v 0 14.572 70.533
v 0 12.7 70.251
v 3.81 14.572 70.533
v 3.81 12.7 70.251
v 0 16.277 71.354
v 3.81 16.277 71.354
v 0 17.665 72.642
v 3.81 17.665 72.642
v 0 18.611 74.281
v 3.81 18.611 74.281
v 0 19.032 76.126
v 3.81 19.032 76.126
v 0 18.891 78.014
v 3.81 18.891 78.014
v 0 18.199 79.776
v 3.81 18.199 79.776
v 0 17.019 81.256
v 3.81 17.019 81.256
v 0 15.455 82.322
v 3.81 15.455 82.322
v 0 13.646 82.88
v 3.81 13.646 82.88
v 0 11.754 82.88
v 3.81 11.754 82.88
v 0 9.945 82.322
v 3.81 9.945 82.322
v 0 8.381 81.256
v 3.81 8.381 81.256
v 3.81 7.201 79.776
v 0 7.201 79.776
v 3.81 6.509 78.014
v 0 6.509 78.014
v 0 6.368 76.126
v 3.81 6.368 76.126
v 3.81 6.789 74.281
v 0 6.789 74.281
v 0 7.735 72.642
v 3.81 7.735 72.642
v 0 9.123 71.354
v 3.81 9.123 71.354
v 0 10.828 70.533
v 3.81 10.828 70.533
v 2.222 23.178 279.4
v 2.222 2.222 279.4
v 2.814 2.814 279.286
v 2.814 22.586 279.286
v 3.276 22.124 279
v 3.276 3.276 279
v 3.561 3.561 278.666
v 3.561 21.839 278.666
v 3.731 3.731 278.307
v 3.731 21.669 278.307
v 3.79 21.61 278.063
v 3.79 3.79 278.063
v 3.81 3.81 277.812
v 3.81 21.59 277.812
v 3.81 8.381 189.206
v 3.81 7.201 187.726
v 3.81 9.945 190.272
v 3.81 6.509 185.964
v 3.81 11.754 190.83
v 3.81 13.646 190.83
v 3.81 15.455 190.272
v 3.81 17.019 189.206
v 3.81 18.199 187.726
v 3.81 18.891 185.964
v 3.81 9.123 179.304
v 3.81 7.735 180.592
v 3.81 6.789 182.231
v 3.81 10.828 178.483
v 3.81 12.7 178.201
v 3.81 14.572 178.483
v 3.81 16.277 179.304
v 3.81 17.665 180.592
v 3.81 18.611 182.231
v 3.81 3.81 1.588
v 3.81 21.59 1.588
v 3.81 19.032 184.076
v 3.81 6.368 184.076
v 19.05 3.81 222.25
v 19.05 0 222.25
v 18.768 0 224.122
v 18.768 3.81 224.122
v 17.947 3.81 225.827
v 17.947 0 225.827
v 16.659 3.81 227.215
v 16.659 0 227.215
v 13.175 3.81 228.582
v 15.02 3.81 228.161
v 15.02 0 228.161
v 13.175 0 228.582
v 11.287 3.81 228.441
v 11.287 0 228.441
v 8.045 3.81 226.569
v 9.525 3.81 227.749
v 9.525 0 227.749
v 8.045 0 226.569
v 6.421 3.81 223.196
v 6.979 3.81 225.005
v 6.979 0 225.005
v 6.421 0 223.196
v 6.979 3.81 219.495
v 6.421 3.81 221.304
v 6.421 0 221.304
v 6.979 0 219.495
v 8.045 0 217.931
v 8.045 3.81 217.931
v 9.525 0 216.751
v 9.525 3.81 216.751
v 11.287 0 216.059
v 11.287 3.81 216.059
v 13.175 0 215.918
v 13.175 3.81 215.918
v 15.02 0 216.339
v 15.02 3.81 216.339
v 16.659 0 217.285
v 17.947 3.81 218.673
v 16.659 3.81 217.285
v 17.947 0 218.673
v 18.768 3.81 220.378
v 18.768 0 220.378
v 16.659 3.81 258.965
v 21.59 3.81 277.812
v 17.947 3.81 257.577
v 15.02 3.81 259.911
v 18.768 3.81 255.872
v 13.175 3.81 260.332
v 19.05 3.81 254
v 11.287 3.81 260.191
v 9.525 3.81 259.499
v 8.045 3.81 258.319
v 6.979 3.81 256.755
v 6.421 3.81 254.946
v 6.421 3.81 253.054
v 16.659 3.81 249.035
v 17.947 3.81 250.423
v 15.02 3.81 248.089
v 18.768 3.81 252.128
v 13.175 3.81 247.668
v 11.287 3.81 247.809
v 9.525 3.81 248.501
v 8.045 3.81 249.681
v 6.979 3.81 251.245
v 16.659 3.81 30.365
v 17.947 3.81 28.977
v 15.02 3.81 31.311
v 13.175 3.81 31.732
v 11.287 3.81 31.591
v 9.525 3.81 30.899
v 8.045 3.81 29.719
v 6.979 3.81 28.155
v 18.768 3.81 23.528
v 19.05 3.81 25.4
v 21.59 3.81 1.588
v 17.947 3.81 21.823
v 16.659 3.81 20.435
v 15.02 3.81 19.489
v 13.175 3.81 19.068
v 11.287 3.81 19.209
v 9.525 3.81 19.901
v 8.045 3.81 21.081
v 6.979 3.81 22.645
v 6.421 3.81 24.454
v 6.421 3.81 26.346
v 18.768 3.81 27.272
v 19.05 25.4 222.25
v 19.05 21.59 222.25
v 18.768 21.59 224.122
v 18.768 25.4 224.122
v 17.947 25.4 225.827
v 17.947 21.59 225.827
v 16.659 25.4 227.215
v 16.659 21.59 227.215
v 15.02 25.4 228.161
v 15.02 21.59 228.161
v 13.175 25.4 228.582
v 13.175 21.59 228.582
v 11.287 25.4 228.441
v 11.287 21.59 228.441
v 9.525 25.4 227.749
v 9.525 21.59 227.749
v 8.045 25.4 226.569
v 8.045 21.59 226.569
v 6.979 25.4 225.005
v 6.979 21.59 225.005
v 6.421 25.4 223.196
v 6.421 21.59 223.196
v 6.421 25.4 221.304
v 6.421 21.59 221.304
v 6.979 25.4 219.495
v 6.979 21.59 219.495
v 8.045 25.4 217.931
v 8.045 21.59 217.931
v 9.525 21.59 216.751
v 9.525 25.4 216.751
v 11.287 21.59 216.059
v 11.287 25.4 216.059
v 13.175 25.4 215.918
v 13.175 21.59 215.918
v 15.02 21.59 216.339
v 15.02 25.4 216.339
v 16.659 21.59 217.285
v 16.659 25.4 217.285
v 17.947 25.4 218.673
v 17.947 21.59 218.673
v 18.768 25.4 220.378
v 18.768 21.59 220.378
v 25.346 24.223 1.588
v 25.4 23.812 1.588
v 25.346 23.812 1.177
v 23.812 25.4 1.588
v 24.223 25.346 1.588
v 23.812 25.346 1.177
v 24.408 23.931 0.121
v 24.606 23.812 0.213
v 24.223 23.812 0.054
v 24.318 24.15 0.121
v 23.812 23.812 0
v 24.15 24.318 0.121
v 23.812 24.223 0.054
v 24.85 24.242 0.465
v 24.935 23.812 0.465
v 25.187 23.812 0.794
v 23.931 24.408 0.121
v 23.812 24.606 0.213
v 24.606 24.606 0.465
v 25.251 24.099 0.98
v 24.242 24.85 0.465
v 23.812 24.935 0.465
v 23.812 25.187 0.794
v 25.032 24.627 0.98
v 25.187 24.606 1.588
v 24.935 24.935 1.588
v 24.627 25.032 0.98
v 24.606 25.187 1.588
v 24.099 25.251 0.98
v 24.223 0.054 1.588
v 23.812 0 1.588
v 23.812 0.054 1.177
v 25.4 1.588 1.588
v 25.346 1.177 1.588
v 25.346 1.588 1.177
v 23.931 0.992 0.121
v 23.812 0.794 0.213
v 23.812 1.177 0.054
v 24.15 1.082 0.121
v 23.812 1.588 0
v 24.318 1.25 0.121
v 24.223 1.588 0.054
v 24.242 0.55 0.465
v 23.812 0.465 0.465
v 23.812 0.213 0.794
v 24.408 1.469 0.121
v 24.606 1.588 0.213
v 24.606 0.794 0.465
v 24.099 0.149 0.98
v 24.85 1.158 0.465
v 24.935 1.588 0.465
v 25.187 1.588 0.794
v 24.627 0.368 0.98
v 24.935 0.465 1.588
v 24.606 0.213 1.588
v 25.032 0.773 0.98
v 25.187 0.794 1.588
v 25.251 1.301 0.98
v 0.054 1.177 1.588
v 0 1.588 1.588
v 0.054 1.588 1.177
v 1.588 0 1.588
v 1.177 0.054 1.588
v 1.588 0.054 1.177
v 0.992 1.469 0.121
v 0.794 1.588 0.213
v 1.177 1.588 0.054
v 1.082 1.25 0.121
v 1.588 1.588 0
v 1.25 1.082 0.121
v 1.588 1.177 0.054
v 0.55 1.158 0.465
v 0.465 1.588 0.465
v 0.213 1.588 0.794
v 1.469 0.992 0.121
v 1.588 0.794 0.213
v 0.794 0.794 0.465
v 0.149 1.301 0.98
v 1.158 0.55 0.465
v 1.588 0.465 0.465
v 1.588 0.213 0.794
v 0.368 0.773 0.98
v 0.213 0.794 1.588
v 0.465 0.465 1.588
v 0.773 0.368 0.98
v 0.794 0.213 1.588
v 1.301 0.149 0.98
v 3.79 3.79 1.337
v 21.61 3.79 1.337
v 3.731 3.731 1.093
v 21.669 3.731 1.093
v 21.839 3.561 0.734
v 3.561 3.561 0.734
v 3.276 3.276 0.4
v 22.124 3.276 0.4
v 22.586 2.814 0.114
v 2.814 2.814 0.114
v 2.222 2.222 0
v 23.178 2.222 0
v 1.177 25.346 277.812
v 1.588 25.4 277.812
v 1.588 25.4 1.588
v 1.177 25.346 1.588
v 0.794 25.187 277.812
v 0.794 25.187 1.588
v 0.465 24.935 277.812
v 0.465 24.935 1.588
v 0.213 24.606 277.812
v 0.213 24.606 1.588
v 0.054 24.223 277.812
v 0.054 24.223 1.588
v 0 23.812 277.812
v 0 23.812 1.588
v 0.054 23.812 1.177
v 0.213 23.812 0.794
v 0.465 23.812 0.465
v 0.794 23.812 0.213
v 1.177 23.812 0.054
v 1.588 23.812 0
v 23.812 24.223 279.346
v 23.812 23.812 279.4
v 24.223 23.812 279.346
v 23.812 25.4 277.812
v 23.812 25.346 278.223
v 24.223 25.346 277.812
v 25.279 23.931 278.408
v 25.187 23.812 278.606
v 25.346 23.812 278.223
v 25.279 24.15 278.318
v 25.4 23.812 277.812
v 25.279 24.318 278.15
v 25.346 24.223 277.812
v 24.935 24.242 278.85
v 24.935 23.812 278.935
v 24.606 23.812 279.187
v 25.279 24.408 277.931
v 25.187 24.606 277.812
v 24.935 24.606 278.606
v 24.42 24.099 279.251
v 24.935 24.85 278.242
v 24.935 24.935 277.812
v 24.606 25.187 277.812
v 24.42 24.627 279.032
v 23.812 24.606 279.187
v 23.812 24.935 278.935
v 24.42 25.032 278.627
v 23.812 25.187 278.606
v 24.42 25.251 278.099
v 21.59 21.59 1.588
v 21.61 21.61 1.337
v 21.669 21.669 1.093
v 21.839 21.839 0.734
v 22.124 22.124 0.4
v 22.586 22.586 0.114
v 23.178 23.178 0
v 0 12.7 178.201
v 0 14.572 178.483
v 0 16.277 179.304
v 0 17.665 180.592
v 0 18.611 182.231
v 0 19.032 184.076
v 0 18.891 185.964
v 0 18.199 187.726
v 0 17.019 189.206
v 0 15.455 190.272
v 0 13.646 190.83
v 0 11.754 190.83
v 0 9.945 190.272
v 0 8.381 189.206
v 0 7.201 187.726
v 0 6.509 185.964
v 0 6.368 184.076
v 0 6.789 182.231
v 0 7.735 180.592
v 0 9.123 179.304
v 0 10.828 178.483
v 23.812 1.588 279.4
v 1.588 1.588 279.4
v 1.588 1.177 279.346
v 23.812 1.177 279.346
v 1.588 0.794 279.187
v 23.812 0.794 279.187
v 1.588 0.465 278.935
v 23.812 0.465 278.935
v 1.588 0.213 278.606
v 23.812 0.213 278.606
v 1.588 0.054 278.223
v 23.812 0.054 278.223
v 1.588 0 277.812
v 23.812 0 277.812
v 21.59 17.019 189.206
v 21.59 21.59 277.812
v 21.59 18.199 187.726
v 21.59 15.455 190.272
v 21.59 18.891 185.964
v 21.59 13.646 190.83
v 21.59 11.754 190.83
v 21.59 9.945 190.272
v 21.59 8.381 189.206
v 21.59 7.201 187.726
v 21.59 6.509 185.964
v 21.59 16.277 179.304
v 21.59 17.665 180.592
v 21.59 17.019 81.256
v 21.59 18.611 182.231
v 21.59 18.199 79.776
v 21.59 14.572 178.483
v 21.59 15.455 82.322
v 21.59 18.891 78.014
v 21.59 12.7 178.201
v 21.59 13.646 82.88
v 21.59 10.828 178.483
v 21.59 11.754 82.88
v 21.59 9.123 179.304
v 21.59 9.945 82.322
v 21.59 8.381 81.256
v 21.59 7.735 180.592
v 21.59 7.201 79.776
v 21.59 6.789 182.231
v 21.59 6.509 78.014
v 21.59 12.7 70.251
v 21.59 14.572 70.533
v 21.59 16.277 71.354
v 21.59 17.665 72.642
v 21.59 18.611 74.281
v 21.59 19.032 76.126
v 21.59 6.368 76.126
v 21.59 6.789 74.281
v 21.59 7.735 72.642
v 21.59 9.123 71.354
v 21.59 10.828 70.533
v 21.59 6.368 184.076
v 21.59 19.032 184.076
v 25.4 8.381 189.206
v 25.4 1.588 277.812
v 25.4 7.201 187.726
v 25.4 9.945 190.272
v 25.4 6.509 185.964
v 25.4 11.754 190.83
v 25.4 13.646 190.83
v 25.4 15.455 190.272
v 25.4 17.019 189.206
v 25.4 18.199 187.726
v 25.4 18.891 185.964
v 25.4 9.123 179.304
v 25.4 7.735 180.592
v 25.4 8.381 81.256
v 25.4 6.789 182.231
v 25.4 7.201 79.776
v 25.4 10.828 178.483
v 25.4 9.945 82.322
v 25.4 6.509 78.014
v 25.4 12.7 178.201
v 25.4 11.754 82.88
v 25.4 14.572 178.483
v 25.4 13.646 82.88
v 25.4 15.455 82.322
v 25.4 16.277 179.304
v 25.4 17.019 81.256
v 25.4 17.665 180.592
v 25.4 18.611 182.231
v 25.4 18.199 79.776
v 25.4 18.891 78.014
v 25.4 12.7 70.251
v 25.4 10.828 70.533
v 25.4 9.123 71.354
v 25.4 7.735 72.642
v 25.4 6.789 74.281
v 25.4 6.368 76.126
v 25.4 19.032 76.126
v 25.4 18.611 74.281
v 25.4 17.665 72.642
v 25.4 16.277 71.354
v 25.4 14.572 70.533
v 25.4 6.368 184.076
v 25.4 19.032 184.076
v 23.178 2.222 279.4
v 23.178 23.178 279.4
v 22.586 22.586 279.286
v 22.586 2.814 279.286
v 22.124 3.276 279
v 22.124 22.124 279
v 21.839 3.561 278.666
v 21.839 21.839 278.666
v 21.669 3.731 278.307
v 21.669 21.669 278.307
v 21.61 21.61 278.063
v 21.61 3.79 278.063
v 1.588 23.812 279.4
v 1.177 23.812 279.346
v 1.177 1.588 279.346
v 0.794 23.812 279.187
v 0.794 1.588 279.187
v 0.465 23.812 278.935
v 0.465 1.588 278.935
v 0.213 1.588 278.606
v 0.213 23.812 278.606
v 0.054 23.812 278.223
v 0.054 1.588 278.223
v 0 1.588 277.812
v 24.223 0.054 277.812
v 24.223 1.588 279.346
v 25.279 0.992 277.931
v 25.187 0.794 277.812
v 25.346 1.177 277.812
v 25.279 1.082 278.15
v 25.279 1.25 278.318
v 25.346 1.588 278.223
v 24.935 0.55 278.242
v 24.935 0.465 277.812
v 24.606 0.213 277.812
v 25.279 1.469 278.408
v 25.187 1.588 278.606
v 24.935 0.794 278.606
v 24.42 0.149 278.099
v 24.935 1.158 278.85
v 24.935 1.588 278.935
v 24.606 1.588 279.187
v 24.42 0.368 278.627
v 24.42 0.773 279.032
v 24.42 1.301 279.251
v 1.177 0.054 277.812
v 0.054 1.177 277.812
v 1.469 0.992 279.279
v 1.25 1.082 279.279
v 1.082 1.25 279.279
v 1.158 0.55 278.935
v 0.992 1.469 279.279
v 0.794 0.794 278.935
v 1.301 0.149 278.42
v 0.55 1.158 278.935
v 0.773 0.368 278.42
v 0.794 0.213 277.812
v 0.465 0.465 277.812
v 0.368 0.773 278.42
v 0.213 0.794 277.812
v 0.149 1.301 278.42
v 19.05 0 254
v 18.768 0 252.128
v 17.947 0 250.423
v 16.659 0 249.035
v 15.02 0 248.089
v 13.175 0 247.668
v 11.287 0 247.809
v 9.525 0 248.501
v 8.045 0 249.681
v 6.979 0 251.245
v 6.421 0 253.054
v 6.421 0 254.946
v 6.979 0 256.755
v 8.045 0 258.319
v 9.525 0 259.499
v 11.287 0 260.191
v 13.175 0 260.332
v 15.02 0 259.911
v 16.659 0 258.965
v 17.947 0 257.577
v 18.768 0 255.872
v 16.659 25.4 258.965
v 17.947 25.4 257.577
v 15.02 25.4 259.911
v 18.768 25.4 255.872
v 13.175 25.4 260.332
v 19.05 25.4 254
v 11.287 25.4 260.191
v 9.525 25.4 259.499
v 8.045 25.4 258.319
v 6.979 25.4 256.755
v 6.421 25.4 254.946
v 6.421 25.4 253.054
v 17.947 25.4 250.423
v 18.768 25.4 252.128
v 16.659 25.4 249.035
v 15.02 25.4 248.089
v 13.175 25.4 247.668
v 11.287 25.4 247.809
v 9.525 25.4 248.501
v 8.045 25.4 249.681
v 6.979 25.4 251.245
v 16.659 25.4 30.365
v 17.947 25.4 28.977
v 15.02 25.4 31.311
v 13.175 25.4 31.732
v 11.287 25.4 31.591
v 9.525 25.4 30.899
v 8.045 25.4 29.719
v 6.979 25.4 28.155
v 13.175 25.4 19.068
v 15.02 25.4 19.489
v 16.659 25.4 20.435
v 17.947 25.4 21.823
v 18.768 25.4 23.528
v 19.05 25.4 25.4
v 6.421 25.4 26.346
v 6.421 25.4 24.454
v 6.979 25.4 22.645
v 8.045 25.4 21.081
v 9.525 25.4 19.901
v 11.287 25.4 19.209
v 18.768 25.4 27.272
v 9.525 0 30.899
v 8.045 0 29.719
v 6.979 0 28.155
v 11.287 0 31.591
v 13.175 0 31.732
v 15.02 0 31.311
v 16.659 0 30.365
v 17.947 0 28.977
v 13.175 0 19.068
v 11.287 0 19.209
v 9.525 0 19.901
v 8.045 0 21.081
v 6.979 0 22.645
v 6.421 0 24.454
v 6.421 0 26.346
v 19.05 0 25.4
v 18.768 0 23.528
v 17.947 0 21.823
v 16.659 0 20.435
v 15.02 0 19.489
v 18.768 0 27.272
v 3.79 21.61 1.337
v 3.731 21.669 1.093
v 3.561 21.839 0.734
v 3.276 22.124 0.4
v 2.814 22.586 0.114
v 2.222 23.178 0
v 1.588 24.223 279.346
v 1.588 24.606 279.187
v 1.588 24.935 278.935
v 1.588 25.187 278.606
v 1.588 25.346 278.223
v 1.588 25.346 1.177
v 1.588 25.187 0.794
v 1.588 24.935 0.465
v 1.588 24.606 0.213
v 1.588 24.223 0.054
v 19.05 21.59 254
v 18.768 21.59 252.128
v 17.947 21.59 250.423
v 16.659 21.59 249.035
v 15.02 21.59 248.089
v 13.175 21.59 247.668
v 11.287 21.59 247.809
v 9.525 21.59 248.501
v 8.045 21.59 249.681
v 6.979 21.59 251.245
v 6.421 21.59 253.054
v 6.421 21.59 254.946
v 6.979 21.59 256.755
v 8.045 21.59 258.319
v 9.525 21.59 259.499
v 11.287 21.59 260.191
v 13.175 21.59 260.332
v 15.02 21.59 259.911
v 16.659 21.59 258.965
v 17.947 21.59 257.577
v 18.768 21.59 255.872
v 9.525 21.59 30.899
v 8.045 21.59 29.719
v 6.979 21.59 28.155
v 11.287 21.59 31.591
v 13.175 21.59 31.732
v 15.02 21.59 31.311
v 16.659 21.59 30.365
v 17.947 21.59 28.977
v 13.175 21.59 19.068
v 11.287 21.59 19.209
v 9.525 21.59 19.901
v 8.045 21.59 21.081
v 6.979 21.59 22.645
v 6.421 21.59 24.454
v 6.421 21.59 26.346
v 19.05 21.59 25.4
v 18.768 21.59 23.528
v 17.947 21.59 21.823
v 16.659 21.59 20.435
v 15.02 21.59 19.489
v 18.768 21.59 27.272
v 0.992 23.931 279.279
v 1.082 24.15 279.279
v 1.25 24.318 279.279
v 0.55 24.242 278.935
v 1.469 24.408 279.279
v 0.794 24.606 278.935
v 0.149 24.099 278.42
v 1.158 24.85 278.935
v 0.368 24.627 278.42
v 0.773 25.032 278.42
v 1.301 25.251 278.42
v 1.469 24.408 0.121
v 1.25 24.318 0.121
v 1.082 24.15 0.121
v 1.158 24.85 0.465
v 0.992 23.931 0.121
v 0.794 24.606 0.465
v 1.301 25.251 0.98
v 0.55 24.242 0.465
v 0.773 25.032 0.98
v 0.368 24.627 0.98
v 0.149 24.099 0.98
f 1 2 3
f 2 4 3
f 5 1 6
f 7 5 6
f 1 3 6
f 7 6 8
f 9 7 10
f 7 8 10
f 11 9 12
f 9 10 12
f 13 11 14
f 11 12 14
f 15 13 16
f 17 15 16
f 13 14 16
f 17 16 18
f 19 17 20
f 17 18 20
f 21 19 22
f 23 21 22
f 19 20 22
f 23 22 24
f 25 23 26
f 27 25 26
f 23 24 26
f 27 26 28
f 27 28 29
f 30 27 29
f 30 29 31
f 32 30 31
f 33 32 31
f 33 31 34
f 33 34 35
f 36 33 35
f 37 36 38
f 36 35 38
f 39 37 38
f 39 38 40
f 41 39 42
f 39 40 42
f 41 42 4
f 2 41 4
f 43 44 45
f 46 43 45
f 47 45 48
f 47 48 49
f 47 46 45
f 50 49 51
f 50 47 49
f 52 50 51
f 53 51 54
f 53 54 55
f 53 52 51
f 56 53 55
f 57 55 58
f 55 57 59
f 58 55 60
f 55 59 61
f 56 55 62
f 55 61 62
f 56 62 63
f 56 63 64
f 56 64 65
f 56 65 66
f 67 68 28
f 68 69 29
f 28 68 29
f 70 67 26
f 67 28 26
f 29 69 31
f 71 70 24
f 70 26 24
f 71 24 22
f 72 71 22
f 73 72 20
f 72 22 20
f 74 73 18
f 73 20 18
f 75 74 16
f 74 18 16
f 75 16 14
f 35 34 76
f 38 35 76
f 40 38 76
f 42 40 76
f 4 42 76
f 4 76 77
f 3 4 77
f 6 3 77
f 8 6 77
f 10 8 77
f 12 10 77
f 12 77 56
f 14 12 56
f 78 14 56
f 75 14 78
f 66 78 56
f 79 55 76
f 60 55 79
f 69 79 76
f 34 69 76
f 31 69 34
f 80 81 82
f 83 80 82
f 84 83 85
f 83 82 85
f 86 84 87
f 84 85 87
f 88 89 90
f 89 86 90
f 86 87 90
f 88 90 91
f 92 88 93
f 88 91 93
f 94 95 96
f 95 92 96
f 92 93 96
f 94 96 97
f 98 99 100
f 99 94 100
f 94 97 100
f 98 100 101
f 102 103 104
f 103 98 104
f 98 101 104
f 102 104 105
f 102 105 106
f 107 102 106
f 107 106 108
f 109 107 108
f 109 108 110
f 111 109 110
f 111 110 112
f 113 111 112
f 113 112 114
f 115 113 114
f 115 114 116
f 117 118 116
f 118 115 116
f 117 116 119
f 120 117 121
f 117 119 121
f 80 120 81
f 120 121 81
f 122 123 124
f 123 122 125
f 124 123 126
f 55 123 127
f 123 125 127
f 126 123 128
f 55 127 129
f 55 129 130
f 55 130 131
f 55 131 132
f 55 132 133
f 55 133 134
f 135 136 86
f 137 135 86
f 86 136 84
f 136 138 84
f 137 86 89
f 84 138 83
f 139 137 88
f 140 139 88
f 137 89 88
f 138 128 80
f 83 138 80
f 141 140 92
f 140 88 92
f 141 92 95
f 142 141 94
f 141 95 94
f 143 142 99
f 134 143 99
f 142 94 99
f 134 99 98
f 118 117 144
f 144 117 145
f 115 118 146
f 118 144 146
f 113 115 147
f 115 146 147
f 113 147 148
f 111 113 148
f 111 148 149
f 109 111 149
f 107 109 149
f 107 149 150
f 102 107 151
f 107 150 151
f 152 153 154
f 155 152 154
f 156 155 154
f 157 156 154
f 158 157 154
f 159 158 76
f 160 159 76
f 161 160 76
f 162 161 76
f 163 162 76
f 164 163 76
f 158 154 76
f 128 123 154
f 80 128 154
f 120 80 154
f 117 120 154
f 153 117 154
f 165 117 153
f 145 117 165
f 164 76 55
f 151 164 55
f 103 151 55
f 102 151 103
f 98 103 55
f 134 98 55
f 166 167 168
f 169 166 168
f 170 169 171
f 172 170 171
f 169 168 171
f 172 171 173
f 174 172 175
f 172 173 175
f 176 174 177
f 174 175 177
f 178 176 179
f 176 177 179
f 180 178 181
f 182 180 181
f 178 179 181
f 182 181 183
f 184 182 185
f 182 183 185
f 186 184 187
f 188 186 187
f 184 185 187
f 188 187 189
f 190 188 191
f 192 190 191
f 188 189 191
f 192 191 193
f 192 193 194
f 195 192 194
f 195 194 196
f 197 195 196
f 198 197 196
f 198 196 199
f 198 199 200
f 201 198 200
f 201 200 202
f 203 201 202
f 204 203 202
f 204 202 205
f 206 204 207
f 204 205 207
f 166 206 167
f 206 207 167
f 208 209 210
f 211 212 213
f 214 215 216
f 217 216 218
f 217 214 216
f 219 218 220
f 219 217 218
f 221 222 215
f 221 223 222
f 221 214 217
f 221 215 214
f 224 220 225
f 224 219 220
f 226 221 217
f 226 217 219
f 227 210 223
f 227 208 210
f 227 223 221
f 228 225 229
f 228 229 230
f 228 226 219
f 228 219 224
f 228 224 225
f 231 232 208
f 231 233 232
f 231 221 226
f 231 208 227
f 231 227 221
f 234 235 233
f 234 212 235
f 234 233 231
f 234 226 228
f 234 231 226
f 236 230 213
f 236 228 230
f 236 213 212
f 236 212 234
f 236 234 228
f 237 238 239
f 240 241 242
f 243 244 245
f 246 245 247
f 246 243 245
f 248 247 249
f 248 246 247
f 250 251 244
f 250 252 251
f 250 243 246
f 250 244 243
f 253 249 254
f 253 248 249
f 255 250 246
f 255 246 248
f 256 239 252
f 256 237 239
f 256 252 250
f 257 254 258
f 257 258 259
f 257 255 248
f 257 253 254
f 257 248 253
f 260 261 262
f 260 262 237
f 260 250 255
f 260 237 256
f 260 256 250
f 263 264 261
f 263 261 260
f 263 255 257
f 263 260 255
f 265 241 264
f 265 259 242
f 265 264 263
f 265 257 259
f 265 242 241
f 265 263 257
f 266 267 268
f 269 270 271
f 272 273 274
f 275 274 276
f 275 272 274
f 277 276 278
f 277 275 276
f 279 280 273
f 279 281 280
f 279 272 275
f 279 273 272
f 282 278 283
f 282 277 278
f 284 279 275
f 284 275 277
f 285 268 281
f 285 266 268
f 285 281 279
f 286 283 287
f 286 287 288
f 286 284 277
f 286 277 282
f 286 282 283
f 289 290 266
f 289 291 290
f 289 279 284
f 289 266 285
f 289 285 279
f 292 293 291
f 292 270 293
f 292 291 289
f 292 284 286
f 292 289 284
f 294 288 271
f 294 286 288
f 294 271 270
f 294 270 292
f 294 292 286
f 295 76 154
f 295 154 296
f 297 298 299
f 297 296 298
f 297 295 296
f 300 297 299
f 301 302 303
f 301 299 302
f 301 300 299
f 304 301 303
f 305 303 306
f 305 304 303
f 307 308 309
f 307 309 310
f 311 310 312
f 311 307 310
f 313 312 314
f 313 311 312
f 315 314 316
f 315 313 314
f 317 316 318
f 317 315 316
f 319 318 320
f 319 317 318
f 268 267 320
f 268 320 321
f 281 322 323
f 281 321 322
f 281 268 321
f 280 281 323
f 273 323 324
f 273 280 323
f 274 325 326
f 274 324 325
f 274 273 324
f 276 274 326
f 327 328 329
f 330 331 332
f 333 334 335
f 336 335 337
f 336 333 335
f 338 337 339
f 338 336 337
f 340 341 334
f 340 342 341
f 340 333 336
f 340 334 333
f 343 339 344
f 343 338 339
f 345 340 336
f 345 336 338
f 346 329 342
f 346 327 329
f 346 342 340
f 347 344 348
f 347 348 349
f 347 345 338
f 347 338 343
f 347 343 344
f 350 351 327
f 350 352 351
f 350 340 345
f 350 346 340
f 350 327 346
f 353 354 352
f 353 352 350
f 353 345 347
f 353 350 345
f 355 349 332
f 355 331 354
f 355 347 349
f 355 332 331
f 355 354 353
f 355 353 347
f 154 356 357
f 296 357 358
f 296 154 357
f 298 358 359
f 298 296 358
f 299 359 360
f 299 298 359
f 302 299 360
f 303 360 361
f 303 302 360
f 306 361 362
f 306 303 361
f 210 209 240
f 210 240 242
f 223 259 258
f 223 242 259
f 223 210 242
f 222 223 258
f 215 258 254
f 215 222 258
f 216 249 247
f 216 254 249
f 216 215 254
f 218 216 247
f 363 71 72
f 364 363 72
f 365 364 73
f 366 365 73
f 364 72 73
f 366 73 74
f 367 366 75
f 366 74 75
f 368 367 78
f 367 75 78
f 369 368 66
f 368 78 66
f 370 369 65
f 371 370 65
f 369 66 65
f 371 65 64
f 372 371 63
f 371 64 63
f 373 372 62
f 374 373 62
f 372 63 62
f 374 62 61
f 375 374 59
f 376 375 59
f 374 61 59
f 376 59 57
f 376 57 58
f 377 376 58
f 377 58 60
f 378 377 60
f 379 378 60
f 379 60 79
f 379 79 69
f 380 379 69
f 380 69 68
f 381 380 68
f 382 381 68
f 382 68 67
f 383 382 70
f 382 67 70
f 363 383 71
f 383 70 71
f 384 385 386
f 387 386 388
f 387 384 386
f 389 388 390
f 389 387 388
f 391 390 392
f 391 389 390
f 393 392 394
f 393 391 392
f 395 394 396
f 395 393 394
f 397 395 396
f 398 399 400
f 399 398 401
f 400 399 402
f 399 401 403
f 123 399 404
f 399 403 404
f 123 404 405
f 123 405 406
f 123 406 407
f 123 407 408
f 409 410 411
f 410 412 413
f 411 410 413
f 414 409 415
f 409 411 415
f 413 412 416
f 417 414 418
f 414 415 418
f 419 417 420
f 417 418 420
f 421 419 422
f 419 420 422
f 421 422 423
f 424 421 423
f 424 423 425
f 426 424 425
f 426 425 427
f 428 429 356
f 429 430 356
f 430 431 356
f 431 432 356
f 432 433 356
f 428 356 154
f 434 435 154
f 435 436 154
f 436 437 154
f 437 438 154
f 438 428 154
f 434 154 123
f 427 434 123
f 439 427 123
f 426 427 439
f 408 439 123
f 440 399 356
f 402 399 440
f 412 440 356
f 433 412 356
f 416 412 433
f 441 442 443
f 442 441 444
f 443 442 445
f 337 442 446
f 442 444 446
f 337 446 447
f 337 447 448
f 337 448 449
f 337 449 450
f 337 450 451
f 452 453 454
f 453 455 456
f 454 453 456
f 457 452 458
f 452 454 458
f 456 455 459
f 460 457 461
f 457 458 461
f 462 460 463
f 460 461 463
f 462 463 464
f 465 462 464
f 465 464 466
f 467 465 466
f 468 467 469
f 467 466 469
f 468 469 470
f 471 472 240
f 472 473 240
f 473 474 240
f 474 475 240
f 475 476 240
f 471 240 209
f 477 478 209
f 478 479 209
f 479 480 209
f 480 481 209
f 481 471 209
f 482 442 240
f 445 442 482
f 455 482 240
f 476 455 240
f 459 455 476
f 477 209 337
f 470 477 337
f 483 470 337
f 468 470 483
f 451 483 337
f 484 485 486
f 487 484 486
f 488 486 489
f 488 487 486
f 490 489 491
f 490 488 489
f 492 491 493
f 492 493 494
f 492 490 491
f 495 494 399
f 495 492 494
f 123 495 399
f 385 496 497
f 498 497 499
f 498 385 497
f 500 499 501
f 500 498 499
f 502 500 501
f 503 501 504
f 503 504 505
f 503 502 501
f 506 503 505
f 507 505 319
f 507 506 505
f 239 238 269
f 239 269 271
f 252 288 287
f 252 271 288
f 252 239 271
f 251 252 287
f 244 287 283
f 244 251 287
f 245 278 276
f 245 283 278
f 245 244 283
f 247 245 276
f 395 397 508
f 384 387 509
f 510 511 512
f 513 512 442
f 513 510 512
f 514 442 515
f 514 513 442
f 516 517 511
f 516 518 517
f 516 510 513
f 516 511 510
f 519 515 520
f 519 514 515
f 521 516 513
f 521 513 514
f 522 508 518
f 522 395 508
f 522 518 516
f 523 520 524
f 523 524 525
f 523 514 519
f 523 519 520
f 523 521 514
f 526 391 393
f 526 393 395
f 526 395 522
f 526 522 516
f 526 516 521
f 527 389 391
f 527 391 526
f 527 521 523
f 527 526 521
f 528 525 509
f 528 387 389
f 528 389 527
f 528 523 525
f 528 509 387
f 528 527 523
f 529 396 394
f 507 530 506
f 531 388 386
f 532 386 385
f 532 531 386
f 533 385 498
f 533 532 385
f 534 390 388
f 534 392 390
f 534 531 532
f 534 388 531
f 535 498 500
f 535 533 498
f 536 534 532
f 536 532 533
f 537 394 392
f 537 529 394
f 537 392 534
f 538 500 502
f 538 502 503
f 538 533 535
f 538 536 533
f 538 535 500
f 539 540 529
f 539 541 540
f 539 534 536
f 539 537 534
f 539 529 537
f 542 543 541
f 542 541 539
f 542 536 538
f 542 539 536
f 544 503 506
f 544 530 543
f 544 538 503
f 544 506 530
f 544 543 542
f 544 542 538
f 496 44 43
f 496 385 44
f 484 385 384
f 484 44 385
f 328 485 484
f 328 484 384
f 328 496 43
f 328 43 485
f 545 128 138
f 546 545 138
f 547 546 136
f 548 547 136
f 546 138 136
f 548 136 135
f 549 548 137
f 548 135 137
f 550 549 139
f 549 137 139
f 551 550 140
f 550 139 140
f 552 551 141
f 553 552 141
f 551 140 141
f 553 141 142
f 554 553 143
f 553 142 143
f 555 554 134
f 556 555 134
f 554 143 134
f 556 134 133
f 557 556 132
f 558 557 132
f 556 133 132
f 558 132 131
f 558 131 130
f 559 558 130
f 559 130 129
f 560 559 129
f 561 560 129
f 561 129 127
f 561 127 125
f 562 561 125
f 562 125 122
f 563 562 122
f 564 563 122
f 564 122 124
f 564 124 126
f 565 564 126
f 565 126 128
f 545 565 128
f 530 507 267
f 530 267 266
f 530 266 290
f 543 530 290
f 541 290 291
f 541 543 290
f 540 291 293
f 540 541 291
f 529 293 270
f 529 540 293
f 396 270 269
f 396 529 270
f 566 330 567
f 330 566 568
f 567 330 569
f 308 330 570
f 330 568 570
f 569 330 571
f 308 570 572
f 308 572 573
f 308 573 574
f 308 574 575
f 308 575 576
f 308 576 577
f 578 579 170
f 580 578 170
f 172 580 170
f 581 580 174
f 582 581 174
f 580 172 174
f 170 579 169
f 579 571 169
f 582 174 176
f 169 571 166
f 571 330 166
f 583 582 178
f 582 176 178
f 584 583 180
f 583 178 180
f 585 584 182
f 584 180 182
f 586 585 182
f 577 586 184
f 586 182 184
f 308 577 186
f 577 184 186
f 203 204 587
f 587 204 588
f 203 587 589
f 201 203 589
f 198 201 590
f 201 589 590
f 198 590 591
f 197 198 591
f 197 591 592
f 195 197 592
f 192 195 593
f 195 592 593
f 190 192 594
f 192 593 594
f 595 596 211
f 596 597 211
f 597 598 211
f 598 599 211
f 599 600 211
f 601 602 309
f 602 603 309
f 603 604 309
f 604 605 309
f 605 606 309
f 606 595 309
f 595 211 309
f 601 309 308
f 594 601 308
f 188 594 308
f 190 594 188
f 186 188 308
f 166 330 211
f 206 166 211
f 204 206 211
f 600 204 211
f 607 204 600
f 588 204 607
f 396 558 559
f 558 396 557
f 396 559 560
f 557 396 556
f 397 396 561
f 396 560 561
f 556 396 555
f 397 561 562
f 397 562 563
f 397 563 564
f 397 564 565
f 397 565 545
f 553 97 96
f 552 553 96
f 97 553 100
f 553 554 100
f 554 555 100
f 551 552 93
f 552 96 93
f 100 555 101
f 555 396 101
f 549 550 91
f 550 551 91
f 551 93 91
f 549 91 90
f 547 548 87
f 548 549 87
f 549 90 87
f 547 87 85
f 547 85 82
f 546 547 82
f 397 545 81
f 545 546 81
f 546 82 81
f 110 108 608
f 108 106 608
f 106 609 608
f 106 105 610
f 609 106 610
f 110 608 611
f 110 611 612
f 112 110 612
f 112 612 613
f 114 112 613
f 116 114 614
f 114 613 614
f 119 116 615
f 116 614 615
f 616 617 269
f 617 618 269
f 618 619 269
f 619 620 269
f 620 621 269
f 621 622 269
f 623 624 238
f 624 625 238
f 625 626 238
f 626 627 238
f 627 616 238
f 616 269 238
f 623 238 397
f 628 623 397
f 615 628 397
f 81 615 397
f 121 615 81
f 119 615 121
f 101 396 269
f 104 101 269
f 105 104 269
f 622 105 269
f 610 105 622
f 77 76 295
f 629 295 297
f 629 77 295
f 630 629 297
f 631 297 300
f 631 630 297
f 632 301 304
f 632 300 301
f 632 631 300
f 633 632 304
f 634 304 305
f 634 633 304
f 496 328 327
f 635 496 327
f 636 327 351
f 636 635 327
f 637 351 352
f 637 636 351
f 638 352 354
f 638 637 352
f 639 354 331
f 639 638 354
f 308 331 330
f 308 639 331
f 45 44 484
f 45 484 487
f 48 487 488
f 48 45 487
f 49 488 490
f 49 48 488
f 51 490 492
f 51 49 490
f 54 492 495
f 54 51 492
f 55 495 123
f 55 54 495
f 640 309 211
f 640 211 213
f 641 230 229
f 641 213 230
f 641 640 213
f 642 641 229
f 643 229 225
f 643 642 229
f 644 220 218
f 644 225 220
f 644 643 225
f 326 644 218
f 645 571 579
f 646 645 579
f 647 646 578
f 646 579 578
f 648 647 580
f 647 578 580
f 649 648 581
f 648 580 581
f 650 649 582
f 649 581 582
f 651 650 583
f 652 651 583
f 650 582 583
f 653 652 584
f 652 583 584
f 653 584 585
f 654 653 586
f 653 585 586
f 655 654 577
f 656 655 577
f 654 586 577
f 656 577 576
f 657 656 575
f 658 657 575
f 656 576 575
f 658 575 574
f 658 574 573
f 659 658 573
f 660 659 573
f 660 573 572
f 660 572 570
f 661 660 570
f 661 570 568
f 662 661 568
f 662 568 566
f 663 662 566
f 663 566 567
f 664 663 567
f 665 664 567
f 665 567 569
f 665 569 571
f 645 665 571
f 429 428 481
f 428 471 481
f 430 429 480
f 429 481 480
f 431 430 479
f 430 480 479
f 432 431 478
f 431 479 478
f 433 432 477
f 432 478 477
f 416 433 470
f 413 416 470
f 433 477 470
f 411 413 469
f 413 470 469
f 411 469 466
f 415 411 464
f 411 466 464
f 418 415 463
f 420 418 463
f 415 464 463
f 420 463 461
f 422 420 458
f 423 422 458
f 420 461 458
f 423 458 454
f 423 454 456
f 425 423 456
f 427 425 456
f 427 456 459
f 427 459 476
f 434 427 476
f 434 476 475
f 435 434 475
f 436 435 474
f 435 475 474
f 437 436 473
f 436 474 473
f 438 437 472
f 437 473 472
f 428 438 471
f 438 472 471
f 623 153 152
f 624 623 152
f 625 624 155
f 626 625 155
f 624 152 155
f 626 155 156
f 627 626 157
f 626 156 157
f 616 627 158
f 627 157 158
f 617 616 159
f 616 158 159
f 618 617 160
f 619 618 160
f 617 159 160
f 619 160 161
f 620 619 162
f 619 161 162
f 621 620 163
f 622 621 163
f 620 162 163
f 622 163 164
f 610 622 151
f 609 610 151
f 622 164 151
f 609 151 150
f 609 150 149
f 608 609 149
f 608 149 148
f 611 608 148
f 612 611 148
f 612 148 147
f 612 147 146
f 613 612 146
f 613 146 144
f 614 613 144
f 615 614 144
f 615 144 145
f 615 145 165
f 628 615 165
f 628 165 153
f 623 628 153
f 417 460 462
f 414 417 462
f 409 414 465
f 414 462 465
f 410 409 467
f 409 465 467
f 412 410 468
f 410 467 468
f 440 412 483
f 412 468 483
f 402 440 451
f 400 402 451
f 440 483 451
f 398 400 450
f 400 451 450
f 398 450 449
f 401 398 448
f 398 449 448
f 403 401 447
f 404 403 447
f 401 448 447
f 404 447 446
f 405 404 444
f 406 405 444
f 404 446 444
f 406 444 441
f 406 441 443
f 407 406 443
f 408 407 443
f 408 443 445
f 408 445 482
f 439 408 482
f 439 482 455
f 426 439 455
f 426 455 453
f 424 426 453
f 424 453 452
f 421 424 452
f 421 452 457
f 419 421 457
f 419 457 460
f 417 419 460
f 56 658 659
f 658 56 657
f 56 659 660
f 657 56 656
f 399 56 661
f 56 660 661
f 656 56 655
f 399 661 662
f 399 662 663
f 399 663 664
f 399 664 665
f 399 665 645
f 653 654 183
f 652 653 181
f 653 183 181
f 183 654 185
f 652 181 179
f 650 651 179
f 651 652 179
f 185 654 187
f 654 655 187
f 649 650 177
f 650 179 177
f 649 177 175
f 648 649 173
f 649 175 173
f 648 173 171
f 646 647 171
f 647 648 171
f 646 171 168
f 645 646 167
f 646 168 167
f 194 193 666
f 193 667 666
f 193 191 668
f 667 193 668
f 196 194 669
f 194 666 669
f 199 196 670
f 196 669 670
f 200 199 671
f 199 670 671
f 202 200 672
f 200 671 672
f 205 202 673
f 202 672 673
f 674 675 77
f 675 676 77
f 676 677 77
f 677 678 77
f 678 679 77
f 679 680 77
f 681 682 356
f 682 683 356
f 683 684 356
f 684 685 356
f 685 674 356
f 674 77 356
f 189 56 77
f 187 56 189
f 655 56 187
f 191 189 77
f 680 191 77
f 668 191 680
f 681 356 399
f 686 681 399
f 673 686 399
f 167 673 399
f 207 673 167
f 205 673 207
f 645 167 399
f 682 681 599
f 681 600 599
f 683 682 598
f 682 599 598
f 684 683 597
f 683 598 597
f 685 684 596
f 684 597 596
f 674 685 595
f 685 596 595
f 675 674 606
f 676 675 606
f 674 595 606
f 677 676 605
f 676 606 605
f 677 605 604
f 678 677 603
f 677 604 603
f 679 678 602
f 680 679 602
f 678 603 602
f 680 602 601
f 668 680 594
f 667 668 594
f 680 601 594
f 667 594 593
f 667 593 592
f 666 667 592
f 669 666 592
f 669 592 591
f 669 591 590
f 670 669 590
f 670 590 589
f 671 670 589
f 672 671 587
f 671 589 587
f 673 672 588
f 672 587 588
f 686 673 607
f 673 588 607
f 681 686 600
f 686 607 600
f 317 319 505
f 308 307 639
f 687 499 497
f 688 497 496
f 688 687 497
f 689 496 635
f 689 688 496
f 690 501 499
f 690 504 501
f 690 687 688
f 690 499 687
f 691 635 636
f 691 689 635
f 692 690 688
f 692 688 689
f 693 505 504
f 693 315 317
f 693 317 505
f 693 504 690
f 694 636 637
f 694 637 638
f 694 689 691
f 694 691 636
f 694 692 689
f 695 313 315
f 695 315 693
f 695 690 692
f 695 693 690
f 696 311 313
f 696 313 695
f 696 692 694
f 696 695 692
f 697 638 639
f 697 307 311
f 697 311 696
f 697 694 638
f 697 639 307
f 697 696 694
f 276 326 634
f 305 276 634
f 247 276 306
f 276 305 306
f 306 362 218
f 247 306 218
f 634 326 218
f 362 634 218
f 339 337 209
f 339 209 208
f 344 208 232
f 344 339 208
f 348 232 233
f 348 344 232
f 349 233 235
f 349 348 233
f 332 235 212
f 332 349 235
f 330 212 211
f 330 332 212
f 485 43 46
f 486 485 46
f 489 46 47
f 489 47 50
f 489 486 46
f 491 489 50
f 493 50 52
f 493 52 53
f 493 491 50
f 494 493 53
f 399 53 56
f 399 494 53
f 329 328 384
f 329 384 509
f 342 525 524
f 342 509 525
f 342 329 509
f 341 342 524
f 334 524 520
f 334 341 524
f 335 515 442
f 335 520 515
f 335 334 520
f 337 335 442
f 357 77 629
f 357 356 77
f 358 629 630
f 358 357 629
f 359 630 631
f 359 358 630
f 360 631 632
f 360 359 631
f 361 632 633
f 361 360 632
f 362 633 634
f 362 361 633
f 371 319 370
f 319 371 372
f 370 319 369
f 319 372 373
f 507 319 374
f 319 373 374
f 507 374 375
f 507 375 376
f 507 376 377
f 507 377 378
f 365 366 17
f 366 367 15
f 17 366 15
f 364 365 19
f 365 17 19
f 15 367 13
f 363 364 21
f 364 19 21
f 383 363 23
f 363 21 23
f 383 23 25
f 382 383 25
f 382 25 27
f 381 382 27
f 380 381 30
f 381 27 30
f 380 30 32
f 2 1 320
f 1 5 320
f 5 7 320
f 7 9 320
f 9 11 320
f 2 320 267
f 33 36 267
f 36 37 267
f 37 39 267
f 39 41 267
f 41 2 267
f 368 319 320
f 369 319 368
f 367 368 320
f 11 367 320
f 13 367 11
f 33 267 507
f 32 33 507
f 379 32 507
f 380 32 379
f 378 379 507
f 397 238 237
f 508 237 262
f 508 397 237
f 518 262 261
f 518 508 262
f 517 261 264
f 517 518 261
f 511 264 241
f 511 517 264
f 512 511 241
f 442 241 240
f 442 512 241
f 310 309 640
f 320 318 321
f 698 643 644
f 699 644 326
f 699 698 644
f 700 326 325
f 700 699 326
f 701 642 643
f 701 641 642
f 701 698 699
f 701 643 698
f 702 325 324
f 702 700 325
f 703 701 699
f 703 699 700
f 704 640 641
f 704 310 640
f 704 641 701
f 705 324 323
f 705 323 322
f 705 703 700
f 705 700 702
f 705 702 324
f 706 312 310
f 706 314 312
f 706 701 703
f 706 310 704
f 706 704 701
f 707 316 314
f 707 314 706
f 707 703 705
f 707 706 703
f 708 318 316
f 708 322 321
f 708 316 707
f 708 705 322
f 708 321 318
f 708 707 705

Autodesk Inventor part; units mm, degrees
ref_plane "YZ Plane" through (0, 0, 0) normal (1, 0, 0) x (0, 1, 0)
ref_plane "XZ Plane" through (0, 0, 0) normal (0, 1, 0) x (-1, 0, 0)
ref_plane "XY Plane" through (0, 0, 0) normal (0, 0, 1) x (1, 0, 0)
sketch "Sketch1" plane through (0, 0, 0) normal (0, 0, 1) x (1, 0, 0)
  line L0 (0, 0) -> (25.4, 0)
  line L1 (25.4, 0) -> (25.4, 25.4)
  line L2 (25.4, 25.4) -> (0, 25.4)
  line L3 (0, 25.4) -> (0, 0)
  dimension "d0" = 25.4
  dimension "d1" = 25.4
extrude "Extrusion1" add sketch "Sketch1" along normal blind 279.4
sketch "Sketch2" plane through (0, 25.4, 0) normal (0, 1, 0) x (1, 0, 0)
  line L0 (0, 0) -> (0, -279.4) projected
  line L1 (25.4, 0) -> (25.4, -279.4) projected
  line L2 (0, 0) -> (0, -25.4)
  line L3 (0, -25.4) -> (12.7, -25.4)
  circle A0 centre (12.7, -25.4) radius 6.35
  line L4 (25.4, -279.4) -> (25.4, -254)
  line L5 (25.4, -254) -> (12.7, -254)
  circle A1 centre (12.7, -254) radius 6.35
  dimension "d4" = 25.4
  dimension "d5" = 12.7
  dimension "d6" = 25.4
  dimension "d7" = 12.7
extrude "Extrusion2" cut sketch "Sketch2" against normal blind 279.4
sketch "Sketch3" plane through (0, 0, 0) normal (0, 0, -1) x (-1, 0, 0)
  line L0 (0, 0) -> (-25.4, 0) projected
  line L1 (-25.4, 25.4) -> (0, 25.4) projected
  line L2 (-25.4, 0) -> (-25.4, 25.4) projected
  line L3 (-25.4, 25.4) -> (-25.4, 21.59)
  line L4 (-25.4, 21.59) -> (-21.59, 21.59)
  line L5 (-25.4, 0) -> (-21.59, 0)
  line L6 (-21.59, 0) -> (-21.59, 3.81)
  line L7 (0, 0) -> (-3.81, 0)
  line L8 (-3.81, 0) -> (-3.81, 3.81)
  line L9 (0, 25.4) -> (-3.81, 25.4)
  line L10 (-3.81, 25.4) -> (-3.81, 21.59)
  line L11 (-3.81, 21.59) -> (-21.59, 21.59)
  line L12 (-21.59, 21.59) -> (-21.59, 3.81)
  line L13 (-21.59, 3.81) -> (-3.81, 3.81)
  line L14 (-3.81, 3.81) -> (-3.81, 21.59)
  dimension "d10" = 3.81
  dimension "d11" = 3.81
  dimension "d12" = 3.81
  dimension "d13" = 3.81
  dimension "d14" = 3.81
  dimension "d15" = 3.81
  dimension "d16" = 3.81
  dimension "d17" = 3.81
extrude "Extrusion3" cut sketch "Sketch3" against normal blind 279.4 contours L13 L12 L11 L14
sketch "Sketch4" plane through (0, 0, 0) normal (0, -1, 0) x (1, 0, 0)
  circle A0 centre (12.7, 254) radius 6.35 projected
  line L0 (0, 0) -> (0, 279.4) projected
  line L1 (12.7, 247.65) -> (12.7, 222.25)
  circle A1 centre (12.7, 222.25) radius 6.35
  dimension "d20" = 25.4
  dimension "d21" = 12.7
extrude "Extrusion4" cut sketch "Sketch4" against normal blind 279.4 contours A1
sketch "Sketch5" plane through (0, 25.4, 0) normal (0, 1, 0) x (1, 0, 0)
  circle A0 centre (12.7, -222.25) radius 6.35 projected
  circle A1 centre (12.7, -25.4) radius 6.35 projected
  circle A2 centre (12.7, -254) radius 6.35 projected
  line L0 (25.4, 0) -> (0, 0) projected
  line L1 (0, 0) -> (0, -279.4) projected
  line L2 (25.4, -279.4) -> (0, -279.4) projected
  line L3 (25.4, 0) -> (25.4, -279.4) projected
sketch "Sketch6" plane through (25.4, 0, 0) normal (1, 0, 0) x (0, 0, -1)
  line L0 (0, 25.4) -> (-279.4, 25.4) projected
  line L1 (0, 0) -> (-279.4, 0) projected
  line L2 (-222.6507, 25.4) -> (-222.6507, 12.7)
  line L3 (-222.6507, 12.7) -> (-184.5507, 12.7)
  circle A0 centre (-184.5507, 12.7) radius 6.35
  line L4 (-178.2007, 12.7) -> (-76.6007, 12.7)
  circle A1 centre (-76.6007, 12.7) radius 6.35
  dimension "d25" = 12.7
  dimension "d24" = 38.1
  dimension "d26" = 101.6
  dimension "d27" = 12.7
extrude "Extrusion5" cut sketch "Sketch6" against normal blind 279.4
fillet "Fillet1" radius 1.5875 20 edges at (0, 0, 139.7) (0, 25.4, 139.7) (12.7, 25.4, 279.4) (12.7, 0, 279.4) (25.4, 12.7, 279.4) (0, 12.7, 279.4) (25.4, 25.4, 139.7) (25.4, 0, 139.7) (25.4, 12.7, 0) (12.7, 25.4, 0) (12.7, 21.59, 0) (3.81, 12.7, 0) (0, 12.7, 0) (12.7, 0, 0) (12.7, 3.81, 0) (21.59, 12.7, 0) (3.81, 12.7, 279.4) (12.7, 21.59, 279.4) (21.59, 12.7, 279.4) (12.7, 3.81, 279.4)
properties part number "Vertical Rod" material "Steel"
